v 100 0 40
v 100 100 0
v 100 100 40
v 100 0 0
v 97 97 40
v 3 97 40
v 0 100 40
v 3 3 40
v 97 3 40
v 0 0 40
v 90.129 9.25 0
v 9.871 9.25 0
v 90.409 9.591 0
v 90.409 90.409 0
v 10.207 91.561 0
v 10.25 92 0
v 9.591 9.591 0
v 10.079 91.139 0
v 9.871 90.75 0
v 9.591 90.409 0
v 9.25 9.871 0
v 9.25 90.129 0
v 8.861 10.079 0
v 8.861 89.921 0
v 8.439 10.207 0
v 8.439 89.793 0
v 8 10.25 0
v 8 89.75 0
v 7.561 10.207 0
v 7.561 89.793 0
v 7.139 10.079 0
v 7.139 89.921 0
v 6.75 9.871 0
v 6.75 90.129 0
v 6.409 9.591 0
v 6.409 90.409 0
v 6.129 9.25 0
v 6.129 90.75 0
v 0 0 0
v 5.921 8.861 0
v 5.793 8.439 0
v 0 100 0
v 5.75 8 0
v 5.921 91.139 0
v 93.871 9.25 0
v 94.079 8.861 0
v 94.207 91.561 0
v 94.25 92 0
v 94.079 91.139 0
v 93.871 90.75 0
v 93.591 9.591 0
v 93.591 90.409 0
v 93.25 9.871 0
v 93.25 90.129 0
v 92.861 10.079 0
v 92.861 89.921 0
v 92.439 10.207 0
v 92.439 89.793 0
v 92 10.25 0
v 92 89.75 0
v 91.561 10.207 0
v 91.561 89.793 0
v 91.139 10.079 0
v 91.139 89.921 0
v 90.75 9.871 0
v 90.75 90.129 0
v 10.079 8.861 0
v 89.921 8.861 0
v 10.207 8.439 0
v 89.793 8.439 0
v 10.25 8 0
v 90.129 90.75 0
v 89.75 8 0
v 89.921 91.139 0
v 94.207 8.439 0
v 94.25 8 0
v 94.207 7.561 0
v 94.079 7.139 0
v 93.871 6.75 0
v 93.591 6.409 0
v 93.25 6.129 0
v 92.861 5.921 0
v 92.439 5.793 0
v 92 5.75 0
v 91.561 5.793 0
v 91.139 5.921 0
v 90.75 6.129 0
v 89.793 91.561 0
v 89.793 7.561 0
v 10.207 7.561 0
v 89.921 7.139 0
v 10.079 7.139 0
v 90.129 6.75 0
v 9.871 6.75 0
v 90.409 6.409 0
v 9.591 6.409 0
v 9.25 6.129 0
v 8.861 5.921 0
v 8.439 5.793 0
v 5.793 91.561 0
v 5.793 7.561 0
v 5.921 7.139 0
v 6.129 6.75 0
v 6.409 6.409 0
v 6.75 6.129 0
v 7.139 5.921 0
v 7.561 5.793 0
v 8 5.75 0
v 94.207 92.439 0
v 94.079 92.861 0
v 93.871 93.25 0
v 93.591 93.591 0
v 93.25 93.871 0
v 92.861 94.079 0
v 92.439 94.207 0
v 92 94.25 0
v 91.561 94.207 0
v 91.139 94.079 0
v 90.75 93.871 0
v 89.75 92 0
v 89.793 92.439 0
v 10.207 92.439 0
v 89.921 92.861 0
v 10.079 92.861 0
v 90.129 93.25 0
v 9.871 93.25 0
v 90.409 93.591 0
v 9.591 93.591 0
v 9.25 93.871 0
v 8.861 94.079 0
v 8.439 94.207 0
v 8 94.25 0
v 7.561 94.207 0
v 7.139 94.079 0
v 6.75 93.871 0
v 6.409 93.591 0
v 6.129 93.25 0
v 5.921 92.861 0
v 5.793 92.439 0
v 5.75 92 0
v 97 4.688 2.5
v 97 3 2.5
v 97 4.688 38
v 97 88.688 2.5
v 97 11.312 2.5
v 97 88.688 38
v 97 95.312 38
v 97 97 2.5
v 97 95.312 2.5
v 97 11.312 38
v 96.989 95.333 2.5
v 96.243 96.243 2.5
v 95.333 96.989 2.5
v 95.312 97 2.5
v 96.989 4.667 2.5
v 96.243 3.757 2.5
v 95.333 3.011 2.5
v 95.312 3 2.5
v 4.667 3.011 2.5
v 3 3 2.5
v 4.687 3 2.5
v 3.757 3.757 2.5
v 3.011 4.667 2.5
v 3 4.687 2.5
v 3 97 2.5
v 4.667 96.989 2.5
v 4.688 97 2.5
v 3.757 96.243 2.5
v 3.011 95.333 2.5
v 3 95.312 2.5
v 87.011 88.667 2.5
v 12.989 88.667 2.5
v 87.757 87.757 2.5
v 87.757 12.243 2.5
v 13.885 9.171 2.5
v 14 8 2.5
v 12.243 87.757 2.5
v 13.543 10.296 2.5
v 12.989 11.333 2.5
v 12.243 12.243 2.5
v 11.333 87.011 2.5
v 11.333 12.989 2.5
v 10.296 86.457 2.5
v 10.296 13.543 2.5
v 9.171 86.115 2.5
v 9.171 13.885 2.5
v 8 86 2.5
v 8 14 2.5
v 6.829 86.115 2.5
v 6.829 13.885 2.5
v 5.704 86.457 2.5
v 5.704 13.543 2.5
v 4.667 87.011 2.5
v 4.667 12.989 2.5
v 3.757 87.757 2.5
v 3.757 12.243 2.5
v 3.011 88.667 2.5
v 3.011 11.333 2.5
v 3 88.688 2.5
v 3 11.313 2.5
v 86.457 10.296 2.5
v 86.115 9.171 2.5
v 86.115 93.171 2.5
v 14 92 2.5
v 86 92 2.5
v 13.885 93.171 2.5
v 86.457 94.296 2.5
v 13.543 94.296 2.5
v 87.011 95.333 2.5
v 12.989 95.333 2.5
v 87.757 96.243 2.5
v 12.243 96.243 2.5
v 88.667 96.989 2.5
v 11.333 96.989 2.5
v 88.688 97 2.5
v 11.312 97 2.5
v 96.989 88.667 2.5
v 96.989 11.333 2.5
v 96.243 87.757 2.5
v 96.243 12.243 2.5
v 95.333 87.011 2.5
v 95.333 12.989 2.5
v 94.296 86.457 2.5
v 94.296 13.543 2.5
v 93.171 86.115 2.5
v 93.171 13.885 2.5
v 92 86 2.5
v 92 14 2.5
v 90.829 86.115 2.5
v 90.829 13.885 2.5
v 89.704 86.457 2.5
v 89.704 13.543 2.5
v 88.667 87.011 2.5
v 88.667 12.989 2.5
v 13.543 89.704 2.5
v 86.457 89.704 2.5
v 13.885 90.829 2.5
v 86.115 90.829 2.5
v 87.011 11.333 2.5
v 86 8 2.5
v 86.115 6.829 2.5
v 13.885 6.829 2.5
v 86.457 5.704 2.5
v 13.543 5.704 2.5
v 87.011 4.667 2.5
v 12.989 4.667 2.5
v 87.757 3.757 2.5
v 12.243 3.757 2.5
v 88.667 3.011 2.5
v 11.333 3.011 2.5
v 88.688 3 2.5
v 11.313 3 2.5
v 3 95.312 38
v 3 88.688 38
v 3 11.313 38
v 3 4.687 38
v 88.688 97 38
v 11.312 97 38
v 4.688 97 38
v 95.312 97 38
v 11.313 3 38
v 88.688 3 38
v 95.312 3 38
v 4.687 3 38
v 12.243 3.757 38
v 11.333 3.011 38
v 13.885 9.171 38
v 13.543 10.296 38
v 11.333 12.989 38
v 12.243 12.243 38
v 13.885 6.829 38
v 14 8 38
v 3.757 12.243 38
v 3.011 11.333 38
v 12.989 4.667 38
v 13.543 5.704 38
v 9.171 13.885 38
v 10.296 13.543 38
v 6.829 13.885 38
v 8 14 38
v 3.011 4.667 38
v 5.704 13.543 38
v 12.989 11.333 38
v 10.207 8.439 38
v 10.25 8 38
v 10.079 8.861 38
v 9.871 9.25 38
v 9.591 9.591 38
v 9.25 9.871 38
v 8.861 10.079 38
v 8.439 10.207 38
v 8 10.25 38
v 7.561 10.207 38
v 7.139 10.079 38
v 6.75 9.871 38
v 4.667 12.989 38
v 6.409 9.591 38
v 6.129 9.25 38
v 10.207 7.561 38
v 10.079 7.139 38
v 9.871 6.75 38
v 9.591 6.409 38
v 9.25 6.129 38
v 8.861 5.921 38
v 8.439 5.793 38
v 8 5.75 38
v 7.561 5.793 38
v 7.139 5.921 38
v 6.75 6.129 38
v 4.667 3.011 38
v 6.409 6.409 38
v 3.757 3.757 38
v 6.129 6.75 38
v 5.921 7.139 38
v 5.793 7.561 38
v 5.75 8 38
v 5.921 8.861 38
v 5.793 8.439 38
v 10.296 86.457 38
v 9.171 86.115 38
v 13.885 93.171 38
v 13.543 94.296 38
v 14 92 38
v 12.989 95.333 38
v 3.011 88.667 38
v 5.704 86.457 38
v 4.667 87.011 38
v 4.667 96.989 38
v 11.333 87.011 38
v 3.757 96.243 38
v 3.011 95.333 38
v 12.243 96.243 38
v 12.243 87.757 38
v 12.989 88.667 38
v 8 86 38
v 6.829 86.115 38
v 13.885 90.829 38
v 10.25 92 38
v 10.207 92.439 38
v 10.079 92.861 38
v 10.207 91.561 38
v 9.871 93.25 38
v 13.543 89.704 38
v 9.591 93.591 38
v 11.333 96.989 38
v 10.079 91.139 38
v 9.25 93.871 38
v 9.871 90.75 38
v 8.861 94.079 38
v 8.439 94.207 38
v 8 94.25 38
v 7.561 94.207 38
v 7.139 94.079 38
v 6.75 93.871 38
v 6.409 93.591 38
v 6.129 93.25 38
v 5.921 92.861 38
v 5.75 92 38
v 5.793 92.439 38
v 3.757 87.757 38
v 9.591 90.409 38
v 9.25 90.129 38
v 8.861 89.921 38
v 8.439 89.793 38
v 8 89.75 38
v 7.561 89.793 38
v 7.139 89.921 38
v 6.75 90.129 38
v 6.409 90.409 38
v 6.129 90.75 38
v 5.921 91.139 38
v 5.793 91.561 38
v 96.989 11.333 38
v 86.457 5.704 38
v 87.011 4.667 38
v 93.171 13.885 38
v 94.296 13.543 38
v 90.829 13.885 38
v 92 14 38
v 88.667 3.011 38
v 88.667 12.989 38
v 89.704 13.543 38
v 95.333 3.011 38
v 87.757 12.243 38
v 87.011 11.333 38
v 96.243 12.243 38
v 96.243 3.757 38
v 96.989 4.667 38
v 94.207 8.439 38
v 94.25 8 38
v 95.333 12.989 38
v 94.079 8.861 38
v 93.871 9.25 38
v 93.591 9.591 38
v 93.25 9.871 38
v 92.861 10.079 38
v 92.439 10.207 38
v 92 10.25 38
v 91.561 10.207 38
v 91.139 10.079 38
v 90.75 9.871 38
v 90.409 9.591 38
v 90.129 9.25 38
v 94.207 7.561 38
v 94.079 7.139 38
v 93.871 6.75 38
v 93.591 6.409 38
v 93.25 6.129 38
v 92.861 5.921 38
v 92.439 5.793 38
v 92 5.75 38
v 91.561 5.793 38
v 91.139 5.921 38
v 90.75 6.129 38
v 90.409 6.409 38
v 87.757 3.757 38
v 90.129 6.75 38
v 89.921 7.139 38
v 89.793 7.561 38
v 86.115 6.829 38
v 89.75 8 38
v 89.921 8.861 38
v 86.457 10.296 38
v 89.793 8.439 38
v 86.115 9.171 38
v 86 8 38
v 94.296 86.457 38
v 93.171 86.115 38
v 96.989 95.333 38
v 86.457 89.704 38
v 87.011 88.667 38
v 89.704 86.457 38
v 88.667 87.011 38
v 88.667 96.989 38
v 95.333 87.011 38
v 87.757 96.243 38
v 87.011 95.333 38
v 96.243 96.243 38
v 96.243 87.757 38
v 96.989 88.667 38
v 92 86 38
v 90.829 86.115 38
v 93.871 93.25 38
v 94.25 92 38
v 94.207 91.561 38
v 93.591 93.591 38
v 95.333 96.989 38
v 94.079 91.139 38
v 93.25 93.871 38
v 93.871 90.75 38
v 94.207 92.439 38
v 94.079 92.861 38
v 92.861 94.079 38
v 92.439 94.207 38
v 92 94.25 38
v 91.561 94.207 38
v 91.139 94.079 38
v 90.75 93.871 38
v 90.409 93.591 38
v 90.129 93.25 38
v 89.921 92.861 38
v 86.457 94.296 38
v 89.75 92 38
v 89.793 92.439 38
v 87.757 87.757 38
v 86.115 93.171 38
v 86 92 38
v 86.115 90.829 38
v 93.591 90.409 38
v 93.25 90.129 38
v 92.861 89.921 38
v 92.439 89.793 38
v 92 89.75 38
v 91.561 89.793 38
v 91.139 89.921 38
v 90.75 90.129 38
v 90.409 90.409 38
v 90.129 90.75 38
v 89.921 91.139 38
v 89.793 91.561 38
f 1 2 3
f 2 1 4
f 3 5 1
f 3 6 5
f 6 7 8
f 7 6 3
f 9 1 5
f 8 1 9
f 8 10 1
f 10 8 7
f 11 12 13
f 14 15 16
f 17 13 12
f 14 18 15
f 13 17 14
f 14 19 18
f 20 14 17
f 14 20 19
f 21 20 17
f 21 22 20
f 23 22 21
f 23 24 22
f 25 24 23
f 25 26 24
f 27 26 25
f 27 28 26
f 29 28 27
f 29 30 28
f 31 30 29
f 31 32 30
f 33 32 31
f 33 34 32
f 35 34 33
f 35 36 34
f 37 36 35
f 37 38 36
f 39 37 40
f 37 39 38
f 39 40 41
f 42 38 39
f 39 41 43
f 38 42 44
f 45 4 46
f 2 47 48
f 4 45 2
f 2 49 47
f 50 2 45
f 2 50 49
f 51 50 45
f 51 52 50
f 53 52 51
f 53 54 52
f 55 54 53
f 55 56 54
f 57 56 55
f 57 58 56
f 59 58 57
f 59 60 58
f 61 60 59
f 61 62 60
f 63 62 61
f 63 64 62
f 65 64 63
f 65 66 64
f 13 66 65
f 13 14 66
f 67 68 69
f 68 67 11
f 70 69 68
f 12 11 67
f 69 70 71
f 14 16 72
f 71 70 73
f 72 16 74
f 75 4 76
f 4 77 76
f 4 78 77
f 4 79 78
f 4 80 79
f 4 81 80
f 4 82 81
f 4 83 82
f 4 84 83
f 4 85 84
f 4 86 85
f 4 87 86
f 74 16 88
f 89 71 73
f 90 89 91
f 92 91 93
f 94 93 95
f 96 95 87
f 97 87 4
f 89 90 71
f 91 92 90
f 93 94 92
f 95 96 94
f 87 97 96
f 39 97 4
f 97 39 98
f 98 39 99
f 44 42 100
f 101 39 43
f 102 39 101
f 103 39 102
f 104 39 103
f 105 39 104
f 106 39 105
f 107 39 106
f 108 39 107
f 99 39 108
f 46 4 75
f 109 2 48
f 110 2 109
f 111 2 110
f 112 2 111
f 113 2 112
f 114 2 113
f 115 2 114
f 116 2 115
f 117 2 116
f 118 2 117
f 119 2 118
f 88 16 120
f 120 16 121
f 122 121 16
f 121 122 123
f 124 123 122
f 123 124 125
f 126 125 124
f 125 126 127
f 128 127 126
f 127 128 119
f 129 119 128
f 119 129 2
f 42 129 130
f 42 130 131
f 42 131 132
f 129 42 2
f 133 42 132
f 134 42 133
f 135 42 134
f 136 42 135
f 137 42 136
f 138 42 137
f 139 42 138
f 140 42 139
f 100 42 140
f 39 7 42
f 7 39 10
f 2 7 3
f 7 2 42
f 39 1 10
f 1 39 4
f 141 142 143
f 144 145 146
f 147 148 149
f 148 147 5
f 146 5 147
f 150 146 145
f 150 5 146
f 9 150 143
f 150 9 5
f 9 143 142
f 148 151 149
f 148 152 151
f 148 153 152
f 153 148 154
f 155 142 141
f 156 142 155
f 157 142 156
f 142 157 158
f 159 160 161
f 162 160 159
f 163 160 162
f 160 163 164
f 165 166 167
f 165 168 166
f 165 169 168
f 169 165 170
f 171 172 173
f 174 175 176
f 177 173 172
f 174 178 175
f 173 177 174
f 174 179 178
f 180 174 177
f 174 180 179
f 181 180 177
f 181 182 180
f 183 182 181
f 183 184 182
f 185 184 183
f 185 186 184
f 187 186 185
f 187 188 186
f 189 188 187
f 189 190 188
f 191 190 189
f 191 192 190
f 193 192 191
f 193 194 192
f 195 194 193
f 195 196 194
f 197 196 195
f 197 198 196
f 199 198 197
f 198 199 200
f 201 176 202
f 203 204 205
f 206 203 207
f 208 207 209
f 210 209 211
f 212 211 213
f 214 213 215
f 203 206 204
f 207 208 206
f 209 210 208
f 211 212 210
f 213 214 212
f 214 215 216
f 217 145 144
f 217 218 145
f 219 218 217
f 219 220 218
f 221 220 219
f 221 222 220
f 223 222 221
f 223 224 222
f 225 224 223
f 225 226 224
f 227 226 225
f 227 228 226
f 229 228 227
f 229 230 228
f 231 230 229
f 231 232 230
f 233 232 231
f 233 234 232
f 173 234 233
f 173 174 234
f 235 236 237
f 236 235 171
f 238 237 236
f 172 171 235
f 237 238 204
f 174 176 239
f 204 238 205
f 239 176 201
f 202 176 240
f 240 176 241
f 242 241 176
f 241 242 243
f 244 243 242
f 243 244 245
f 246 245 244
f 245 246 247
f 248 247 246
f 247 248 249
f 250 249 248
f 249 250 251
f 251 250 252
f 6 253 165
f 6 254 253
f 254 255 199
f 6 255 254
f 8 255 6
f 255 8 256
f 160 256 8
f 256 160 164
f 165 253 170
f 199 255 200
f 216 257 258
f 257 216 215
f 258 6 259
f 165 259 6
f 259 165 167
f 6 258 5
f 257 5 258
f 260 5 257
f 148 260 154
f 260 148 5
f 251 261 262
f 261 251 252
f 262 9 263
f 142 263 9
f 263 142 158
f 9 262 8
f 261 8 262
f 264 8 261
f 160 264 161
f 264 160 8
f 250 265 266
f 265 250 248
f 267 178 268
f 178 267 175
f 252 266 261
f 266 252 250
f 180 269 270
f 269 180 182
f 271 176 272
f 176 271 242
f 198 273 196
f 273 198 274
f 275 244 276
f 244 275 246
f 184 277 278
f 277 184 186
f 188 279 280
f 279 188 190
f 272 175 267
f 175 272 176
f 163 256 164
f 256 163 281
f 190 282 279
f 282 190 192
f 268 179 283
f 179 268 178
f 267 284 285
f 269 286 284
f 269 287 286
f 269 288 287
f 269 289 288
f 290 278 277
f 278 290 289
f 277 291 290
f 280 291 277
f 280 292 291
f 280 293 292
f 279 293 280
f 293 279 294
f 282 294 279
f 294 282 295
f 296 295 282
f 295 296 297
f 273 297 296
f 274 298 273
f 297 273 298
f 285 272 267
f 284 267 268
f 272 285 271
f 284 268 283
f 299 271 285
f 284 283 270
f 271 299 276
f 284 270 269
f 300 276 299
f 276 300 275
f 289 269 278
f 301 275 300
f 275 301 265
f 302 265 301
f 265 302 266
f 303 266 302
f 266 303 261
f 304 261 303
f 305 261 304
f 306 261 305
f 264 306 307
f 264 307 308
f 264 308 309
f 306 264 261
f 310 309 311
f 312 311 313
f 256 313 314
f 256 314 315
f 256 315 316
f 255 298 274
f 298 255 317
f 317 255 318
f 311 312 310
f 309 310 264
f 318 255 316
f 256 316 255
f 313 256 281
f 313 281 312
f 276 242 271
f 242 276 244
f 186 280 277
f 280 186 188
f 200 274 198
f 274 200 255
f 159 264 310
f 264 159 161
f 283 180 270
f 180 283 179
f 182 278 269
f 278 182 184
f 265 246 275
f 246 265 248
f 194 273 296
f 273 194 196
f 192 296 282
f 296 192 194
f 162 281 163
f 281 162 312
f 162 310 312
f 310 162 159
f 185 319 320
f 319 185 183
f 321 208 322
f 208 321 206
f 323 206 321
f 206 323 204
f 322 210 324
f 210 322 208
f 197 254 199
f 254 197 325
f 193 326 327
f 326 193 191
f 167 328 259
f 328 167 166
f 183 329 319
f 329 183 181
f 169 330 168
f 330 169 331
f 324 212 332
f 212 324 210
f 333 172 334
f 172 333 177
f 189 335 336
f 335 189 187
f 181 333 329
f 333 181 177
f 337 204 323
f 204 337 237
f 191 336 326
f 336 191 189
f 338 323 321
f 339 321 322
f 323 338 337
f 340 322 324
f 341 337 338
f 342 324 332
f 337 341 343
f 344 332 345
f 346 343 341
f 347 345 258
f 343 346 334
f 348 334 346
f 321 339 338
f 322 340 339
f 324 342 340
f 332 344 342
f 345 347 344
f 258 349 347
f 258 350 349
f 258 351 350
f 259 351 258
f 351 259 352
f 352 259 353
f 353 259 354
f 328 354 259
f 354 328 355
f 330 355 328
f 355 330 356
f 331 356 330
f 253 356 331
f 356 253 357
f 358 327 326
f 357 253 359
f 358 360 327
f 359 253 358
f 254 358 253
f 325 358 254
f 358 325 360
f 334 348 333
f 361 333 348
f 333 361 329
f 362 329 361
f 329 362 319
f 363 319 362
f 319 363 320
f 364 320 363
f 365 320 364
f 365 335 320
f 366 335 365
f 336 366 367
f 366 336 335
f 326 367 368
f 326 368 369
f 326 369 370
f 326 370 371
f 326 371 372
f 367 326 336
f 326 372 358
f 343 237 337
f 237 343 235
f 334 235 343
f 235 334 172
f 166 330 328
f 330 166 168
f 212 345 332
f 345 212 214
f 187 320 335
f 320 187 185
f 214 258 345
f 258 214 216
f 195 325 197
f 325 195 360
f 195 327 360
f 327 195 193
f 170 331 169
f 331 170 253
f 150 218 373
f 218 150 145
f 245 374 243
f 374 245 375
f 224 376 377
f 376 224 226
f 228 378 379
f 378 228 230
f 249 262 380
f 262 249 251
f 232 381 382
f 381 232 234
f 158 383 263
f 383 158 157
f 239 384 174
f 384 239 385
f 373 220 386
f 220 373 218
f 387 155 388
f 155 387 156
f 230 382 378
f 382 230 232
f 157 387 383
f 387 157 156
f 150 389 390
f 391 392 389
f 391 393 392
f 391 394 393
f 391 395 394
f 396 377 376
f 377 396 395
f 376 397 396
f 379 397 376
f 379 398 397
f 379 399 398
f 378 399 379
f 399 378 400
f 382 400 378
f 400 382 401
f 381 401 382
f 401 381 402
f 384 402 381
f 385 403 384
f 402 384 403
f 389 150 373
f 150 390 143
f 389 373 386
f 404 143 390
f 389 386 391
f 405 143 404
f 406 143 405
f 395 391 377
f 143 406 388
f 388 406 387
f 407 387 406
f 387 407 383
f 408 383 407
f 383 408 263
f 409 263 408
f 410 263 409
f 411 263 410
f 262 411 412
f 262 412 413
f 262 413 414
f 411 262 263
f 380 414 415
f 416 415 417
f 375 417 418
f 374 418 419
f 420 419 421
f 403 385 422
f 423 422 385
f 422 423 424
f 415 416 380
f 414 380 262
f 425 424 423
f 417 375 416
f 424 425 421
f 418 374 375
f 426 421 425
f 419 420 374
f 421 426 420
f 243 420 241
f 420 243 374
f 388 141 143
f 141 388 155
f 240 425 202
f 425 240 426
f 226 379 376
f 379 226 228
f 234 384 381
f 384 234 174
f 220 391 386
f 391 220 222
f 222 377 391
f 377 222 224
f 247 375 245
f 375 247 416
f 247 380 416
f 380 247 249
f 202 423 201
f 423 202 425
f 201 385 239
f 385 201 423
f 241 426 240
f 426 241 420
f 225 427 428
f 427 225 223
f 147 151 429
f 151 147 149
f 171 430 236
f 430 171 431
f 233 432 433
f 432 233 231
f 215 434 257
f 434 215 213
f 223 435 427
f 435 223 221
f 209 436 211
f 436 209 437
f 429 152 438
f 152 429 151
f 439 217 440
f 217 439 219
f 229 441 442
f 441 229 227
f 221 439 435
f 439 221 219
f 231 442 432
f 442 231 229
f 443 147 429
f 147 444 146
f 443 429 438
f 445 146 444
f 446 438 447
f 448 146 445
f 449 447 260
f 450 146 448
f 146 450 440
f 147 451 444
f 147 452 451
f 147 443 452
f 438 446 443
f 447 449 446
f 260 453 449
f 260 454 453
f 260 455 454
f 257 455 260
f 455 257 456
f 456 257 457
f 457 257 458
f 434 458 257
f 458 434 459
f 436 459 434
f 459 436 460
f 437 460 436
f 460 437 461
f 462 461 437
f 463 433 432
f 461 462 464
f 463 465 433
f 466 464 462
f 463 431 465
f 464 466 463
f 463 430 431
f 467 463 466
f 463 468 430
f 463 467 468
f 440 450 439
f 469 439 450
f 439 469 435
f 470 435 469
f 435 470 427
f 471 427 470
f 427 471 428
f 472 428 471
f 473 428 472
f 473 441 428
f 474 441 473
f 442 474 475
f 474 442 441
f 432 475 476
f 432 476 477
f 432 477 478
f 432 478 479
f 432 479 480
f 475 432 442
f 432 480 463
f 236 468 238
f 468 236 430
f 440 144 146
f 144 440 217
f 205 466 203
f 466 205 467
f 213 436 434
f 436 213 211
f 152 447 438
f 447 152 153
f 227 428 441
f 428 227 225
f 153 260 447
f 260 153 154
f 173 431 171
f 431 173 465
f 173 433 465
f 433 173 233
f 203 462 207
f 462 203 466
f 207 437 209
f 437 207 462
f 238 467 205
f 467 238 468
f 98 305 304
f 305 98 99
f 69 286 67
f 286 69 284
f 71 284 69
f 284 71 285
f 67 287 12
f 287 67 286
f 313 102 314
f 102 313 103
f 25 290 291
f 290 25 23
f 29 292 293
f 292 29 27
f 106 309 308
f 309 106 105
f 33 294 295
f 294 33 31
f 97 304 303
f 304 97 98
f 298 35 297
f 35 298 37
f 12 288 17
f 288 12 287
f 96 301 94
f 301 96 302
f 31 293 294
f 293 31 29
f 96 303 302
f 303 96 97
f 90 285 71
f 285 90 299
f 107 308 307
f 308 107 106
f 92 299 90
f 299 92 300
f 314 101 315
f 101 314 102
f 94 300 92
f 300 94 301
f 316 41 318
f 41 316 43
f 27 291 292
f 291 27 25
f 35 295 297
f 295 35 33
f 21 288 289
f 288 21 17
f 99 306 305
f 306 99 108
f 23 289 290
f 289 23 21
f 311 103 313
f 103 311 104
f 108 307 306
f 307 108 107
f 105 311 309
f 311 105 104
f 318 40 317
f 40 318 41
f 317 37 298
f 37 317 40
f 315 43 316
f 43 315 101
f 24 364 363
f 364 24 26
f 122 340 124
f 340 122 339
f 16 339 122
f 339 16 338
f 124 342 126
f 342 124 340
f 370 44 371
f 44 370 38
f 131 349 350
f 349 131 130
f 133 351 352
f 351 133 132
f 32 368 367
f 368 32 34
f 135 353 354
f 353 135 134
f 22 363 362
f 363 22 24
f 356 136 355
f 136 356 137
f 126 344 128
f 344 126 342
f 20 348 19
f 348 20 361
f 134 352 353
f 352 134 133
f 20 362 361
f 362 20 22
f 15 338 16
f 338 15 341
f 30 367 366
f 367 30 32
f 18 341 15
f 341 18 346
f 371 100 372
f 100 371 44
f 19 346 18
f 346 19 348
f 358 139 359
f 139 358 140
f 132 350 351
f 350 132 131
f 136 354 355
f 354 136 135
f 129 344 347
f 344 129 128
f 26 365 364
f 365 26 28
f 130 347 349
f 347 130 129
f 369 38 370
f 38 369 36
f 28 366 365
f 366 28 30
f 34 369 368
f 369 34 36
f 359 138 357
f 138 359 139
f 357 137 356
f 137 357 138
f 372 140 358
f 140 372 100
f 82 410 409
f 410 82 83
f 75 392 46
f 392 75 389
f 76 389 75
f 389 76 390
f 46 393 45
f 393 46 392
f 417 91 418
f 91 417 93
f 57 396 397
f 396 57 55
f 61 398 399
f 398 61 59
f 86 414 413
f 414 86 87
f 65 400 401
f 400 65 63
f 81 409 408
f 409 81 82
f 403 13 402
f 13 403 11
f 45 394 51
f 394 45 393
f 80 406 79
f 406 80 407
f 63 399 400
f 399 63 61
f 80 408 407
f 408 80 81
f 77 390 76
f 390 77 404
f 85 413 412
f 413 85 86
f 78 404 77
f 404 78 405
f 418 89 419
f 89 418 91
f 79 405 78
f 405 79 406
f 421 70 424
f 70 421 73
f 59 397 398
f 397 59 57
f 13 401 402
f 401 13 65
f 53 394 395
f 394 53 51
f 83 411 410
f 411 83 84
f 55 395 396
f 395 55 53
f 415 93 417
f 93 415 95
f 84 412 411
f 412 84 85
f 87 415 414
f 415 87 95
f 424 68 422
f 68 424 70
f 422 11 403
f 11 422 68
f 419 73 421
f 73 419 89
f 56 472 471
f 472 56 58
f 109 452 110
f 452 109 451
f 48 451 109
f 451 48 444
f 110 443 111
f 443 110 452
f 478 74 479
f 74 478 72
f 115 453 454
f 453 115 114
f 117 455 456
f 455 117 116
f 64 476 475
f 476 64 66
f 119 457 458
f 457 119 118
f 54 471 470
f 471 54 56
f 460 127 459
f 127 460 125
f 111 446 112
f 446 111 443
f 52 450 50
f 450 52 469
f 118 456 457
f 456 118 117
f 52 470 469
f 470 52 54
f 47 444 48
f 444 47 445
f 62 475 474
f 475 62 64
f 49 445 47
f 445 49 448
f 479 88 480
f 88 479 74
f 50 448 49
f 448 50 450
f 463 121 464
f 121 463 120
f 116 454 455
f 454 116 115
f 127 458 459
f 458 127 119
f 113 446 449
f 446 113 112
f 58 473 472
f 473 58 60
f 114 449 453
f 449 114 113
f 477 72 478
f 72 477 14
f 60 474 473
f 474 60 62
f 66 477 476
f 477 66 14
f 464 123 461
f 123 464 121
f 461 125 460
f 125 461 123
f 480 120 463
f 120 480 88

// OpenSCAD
$fn = 32;

// ----------------------------------------------------------------------
// Enclosure body: 100 x 100 x 40 mm, wall 3 mm
// ----------------------------------------------------------------------

// --- parameters (mm) ---
length = 100;             // outside length, X
width = 100;              // outside width, Y
height = 40;              // outside height, Z
wall = 3;                 // side wall thickness
floor_t = 2.5;            // floor thickness
boss_d = 12;              // corner boss diameter
boss_h = 35.5;            // corner boss height above the floor
boss_hole_d = 4.5;        // lid screw clearance in the boss
boss_lip = 8;             // boss centre inset from the corner

module shell() {
  difference() {
    cube([length, width, height]);
    /* hollow, open at the top */
    translate([wall, wall, floor_t])
      cube([length - 2 * wall, width - 2 * wall, height]);
  }
}

module bosses() {
  /* corner bosses, sunk 1 mm into the floor */
  for (sx = [0, 1]) for (sy = [0, 1])
    translate([sx * (length - 2 * boss_lip) + boss_lip, sy * (width - 2 * boss_lip) + boss_lip, floor_t - 1])
      cylinder(h = boss_h + 1, d = boss_d);
}

difference() {
  union() {
    shell();
    bosses();
  }
  /* boss screw holes */
  for (sx = [0, 1]) for (sy = [0, 1])
    translate([sx * (length - 2 * boss_lip) + boss_lip, sy * (width - 2 * boss_lip) + boss_lip, -1]) cylinder(h = floor_t + boss_h + 2, d = boss_hole_d);
}
